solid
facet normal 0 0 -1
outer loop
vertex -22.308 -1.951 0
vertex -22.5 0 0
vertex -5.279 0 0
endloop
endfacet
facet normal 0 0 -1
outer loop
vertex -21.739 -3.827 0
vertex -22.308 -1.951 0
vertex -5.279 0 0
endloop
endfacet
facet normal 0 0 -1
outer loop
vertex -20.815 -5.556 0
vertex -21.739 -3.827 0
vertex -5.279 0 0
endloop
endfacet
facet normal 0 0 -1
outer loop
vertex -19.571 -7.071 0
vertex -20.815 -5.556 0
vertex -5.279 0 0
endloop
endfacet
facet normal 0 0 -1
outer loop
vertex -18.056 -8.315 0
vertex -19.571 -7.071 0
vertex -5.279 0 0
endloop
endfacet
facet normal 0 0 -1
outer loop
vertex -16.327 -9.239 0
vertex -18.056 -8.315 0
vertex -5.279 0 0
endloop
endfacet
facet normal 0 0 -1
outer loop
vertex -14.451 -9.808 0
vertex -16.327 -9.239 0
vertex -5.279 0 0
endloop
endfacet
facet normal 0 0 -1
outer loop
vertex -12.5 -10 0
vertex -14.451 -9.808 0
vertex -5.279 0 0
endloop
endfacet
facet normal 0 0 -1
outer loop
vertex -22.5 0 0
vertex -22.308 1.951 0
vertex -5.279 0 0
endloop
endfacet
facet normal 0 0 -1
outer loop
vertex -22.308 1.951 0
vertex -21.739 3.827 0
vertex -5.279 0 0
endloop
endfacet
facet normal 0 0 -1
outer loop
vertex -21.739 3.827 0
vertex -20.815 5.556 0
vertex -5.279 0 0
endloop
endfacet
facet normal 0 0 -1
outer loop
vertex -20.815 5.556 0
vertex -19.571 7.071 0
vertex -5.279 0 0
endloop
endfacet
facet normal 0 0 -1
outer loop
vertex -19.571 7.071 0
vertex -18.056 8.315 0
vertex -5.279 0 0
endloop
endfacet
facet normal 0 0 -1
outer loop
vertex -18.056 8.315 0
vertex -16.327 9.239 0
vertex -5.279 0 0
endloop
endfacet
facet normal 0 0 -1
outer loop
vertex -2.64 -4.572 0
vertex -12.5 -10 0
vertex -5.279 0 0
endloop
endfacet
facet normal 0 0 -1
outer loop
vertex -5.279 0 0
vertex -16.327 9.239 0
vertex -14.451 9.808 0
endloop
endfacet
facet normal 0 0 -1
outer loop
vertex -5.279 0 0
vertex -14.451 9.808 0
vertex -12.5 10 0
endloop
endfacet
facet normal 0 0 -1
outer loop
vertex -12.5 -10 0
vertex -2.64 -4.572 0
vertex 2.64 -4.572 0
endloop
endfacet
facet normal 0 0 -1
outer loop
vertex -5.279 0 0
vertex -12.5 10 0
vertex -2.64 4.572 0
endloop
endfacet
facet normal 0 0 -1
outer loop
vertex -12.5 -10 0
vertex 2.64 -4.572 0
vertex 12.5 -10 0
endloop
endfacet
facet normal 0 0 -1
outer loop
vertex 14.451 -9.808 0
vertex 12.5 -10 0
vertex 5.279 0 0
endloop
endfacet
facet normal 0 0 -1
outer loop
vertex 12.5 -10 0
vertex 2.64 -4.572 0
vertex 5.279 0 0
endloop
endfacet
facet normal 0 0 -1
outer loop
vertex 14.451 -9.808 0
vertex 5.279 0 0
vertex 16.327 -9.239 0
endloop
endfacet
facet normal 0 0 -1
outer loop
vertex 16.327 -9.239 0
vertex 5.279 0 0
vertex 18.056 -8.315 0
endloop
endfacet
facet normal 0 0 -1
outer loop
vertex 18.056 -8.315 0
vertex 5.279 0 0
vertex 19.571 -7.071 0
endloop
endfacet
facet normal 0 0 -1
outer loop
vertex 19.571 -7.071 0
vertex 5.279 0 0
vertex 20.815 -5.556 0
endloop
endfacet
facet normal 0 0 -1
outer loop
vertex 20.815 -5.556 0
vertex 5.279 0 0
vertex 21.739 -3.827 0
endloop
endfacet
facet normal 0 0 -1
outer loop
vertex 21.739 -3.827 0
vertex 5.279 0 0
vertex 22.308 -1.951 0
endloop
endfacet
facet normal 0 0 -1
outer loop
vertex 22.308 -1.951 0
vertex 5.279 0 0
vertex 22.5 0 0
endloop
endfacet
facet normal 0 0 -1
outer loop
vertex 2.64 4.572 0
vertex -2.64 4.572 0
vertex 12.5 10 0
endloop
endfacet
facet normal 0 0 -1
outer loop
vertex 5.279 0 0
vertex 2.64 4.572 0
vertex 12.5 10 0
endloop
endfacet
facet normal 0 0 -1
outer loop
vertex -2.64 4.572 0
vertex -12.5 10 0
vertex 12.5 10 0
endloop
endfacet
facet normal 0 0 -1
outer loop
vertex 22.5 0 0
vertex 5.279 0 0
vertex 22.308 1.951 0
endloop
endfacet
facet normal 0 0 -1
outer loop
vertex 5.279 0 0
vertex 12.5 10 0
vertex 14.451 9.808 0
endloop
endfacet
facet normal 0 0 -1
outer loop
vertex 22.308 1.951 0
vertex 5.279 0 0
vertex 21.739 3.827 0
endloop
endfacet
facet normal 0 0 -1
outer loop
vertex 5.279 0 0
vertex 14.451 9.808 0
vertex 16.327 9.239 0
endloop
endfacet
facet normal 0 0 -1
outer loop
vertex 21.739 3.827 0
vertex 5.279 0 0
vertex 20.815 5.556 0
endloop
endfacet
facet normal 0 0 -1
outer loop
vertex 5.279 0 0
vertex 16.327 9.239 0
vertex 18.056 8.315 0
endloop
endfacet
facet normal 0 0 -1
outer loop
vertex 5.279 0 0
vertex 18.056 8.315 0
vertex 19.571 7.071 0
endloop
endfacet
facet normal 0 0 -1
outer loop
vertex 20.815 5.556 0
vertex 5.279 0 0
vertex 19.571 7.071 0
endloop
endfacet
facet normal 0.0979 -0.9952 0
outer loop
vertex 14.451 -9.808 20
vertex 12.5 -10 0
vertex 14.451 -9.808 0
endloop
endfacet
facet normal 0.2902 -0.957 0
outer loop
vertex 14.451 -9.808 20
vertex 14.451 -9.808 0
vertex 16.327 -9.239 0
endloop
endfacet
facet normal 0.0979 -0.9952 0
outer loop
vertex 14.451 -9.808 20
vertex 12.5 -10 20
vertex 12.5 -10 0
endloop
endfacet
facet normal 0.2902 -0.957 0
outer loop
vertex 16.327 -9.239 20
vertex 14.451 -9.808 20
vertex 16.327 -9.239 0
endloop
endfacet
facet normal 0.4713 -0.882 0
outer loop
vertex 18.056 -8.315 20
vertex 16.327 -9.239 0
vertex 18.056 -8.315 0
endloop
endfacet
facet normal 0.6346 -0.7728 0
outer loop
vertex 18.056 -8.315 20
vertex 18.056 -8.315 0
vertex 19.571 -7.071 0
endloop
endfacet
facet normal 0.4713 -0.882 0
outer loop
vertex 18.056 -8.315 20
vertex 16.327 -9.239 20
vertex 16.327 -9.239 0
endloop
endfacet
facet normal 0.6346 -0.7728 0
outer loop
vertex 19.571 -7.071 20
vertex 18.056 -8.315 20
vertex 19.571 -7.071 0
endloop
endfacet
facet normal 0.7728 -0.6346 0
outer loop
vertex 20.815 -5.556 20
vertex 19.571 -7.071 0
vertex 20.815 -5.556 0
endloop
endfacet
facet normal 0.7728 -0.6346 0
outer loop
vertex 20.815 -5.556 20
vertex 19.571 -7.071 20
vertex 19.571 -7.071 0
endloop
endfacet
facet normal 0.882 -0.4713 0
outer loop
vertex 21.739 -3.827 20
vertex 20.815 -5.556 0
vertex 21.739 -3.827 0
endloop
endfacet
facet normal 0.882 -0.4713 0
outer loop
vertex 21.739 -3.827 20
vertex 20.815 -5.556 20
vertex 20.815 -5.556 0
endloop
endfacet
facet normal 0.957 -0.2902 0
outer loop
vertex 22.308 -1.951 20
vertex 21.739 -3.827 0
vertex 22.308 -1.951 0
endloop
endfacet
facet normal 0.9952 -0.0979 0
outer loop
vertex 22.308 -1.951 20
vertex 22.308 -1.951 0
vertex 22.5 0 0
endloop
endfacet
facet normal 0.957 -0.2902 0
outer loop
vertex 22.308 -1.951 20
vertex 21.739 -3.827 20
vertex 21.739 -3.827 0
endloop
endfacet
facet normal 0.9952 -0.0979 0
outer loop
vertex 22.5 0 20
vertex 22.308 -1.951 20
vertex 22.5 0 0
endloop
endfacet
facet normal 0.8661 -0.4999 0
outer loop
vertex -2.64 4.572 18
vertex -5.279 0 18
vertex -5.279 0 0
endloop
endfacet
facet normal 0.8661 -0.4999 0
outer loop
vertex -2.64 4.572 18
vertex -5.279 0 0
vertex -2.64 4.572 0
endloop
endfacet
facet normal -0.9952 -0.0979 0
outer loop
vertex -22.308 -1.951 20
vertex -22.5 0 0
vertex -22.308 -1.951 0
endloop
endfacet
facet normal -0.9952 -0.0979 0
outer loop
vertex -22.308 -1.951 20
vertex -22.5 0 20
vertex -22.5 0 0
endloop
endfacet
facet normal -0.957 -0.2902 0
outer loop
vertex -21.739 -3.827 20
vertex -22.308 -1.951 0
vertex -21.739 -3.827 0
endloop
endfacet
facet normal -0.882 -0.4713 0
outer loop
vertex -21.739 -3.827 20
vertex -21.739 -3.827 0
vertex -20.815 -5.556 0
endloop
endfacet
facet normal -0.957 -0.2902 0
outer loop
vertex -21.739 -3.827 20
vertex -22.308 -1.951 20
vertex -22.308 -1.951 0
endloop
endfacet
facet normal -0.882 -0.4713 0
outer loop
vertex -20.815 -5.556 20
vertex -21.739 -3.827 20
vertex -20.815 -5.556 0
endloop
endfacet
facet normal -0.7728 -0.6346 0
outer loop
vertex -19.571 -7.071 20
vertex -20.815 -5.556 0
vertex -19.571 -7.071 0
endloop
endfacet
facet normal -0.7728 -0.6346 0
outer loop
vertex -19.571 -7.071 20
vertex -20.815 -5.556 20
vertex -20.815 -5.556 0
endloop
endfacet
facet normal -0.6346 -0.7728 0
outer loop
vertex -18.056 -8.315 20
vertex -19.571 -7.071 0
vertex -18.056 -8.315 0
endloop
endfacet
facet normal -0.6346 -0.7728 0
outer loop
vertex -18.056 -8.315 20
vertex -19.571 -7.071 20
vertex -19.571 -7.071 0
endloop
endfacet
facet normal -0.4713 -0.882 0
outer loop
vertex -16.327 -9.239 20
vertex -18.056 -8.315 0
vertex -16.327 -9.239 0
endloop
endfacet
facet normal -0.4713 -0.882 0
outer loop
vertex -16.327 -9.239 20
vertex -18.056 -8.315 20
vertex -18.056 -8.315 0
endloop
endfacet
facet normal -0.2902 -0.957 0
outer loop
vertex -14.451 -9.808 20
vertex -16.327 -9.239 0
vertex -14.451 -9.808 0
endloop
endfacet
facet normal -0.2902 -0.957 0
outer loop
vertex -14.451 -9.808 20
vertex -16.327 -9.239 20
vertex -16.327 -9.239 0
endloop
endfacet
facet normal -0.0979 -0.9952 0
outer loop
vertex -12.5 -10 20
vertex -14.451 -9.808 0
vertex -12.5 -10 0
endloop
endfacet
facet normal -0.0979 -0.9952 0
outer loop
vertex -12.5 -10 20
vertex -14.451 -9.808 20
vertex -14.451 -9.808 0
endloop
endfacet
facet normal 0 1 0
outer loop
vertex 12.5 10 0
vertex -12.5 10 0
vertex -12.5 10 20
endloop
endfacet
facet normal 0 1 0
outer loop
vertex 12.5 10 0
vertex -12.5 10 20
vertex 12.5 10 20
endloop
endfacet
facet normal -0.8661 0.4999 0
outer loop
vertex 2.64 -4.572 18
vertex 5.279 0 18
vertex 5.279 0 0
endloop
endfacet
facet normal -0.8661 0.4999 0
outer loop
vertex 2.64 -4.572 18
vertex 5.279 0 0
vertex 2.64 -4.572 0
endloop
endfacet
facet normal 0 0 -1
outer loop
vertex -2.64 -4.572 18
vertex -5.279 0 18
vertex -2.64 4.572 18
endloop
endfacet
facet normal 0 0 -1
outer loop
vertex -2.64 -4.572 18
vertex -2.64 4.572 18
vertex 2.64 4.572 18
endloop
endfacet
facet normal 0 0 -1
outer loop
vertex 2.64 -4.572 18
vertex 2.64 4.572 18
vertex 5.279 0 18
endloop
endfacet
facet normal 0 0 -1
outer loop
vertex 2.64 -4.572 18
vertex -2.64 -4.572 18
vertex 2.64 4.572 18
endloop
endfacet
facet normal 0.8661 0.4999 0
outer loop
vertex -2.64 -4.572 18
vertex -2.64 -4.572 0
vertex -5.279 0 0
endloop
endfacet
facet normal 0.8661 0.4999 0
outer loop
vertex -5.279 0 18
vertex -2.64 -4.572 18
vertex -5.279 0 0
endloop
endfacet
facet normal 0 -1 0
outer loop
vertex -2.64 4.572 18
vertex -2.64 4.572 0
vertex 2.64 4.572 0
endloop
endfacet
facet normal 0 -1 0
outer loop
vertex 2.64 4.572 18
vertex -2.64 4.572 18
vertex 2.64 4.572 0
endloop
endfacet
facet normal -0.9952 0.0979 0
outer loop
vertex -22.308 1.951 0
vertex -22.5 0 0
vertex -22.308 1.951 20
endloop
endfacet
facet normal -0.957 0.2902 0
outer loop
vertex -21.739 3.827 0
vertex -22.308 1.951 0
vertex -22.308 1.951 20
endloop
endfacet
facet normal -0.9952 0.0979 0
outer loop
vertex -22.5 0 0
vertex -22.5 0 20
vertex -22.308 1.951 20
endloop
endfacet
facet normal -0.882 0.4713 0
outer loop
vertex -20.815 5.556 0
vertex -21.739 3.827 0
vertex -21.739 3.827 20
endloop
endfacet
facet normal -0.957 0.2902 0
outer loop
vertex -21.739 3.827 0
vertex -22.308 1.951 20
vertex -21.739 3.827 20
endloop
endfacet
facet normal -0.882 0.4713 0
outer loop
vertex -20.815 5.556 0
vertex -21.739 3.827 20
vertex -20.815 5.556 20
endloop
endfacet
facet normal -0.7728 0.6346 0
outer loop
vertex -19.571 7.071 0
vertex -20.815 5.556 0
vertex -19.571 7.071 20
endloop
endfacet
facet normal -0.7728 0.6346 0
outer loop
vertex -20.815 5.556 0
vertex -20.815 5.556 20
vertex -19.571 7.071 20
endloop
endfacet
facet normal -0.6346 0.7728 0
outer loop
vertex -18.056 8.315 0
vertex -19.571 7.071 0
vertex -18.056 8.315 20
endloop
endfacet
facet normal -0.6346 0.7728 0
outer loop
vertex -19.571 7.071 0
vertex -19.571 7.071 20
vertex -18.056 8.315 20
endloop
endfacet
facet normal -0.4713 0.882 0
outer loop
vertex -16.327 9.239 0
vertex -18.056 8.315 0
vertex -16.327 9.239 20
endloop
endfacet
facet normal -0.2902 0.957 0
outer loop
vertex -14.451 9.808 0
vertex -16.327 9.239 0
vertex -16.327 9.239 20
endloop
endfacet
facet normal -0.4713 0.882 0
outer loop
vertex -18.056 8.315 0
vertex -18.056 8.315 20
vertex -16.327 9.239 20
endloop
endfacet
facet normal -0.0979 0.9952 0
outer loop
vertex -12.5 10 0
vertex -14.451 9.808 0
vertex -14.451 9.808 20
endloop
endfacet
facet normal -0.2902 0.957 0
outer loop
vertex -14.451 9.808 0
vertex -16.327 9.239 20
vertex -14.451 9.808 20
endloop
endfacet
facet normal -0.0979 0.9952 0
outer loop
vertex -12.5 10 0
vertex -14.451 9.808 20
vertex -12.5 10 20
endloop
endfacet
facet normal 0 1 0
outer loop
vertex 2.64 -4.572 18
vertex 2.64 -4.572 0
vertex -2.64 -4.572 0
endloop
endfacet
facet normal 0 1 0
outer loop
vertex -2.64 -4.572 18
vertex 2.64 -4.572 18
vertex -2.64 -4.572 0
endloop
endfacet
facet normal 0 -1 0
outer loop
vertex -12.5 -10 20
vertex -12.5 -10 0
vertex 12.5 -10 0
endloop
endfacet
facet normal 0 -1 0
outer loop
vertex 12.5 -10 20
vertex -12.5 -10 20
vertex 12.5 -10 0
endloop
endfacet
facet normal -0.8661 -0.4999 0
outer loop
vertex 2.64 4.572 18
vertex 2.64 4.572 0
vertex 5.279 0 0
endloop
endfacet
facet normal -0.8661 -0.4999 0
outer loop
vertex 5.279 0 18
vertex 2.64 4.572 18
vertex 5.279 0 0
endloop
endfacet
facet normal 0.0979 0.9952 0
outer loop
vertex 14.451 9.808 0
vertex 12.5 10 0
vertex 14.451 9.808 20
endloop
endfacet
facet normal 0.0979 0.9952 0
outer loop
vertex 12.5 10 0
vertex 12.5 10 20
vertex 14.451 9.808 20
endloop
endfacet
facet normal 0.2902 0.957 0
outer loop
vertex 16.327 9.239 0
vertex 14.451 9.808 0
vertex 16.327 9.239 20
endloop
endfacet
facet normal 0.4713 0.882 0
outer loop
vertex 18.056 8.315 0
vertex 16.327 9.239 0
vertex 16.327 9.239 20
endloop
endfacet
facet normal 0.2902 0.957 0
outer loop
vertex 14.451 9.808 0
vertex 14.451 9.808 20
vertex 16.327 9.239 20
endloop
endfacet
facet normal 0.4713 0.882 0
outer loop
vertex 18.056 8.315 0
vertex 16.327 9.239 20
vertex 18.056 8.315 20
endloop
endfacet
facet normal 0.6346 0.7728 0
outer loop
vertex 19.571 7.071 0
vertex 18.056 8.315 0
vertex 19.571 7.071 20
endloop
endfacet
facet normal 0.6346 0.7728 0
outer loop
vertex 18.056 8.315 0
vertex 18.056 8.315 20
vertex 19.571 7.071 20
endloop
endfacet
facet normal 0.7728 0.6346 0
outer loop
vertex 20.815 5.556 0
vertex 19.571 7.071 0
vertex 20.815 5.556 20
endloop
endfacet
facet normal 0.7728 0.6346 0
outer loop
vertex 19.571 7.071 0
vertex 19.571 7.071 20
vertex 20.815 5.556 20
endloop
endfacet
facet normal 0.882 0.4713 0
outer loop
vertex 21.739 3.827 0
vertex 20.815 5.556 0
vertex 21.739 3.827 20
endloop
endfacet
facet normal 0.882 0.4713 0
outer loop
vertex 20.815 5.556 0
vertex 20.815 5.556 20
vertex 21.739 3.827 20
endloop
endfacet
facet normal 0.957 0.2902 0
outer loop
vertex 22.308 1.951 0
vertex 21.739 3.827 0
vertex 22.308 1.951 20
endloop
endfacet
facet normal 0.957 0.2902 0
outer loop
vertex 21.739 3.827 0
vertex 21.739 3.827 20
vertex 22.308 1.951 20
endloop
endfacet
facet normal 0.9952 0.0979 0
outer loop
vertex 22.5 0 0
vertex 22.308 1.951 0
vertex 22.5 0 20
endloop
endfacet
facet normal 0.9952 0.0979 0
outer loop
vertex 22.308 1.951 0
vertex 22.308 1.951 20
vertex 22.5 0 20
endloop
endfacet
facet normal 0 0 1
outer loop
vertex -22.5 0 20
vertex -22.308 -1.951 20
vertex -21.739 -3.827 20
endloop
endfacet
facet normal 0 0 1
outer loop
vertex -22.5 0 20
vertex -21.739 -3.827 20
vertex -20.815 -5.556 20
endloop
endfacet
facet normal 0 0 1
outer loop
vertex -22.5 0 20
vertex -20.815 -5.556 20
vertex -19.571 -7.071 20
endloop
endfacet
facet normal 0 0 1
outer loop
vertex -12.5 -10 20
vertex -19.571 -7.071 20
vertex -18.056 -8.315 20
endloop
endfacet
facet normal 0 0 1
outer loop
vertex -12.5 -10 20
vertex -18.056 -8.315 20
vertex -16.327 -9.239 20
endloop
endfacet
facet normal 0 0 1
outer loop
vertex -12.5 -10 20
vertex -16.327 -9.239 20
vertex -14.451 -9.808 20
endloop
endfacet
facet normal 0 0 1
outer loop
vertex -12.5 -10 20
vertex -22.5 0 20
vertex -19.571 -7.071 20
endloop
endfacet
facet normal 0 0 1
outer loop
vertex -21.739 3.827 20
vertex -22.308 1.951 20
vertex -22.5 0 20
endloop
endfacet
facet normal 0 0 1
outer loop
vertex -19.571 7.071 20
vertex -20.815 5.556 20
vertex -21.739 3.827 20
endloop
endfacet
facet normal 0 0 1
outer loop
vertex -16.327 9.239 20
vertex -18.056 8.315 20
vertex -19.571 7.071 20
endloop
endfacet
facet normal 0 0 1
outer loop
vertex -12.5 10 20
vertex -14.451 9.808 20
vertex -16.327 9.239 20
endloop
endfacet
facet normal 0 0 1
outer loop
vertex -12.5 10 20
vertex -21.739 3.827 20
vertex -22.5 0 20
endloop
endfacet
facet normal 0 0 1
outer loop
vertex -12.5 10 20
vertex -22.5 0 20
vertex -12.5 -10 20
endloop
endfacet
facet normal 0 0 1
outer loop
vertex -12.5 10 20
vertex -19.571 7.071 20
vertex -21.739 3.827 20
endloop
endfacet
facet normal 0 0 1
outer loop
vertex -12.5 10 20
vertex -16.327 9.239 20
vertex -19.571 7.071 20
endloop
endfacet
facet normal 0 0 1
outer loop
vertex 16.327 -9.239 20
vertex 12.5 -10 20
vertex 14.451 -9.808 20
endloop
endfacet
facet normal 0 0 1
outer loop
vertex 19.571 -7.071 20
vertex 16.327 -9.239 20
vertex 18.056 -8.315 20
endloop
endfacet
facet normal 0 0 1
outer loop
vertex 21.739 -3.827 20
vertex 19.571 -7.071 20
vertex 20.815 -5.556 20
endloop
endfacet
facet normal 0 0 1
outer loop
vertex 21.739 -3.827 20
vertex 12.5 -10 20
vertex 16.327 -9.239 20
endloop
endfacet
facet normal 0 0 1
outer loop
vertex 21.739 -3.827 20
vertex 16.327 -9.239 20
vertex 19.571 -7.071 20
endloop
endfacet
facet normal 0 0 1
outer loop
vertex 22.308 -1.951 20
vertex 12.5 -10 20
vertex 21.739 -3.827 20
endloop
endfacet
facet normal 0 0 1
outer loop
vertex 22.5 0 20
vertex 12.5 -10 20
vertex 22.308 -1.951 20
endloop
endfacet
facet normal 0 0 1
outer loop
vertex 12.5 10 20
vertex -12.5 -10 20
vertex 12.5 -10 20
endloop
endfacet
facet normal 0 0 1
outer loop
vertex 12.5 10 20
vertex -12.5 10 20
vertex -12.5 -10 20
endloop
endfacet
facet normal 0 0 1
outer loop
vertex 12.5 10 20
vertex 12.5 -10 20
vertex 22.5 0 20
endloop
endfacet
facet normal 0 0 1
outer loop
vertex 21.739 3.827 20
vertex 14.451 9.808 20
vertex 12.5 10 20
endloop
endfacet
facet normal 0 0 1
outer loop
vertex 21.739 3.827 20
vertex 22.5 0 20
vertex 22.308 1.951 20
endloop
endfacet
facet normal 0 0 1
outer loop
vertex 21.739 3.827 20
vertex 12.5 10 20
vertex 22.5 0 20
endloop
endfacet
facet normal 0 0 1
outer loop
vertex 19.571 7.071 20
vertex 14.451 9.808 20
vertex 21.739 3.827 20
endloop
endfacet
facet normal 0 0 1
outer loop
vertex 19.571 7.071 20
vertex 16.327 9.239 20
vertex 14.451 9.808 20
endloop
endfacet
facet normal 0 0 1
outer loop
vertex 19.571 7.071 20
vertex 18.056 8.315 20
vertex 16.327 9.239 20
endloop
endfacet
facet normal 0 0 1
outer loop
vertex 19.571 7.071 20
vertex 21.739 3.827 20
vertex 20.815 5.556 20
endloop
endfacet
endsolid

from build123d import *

# Parameters (mm, degrees)
F0_W     = 45
F0_H     = 20
F1_DEPTH = 20
F3_DEPTH = 18
F4_R     = 9.99999


# Not quite as in the source:
# - a fillet or chamfer is up to 0.001 mm smaller than in the source, because OpenCascade refuses the exact size


with BuildPart() as f1:
    # F0 (on Top) → F1 (new body)
    with BuildSketch(Plane.XY):
        Rectangle(F0_W, F0_H)
    extrude(amount=F1_DEPTH)

    # F2 (on face) → F3 (cut)
    with BuildSketch(Plane(origin=(0, 0, 0), x_dir=(1, 0, 0), z_dir=(0, 0, -1))):
        Polygon((2.6396454307, -4.572), (5.2792908615, 0), (2.6396454307, 4.572), (-2.6396454307, 4.572), (-5.2792908615, 0), (-2.6396454307, -4.572), align=None)
    extrude(amount=-F3_DEPTH, mode=Mode.SUBTRACT)

    # F4 (radius 10 in the source; OpenCascade refuses exactly that, so slightly less here)
    f4_edges = [f1.edges().sort_by_distance(p)[0] for p in [
        (22.5, -10, 10),
        (-22.5, -10, 10),
        (22.5, 10, 10),
        (-22.5, 10, 10),
    ]]
    fillet(f4_edges, radius=F4_R)


solid = f1.part
